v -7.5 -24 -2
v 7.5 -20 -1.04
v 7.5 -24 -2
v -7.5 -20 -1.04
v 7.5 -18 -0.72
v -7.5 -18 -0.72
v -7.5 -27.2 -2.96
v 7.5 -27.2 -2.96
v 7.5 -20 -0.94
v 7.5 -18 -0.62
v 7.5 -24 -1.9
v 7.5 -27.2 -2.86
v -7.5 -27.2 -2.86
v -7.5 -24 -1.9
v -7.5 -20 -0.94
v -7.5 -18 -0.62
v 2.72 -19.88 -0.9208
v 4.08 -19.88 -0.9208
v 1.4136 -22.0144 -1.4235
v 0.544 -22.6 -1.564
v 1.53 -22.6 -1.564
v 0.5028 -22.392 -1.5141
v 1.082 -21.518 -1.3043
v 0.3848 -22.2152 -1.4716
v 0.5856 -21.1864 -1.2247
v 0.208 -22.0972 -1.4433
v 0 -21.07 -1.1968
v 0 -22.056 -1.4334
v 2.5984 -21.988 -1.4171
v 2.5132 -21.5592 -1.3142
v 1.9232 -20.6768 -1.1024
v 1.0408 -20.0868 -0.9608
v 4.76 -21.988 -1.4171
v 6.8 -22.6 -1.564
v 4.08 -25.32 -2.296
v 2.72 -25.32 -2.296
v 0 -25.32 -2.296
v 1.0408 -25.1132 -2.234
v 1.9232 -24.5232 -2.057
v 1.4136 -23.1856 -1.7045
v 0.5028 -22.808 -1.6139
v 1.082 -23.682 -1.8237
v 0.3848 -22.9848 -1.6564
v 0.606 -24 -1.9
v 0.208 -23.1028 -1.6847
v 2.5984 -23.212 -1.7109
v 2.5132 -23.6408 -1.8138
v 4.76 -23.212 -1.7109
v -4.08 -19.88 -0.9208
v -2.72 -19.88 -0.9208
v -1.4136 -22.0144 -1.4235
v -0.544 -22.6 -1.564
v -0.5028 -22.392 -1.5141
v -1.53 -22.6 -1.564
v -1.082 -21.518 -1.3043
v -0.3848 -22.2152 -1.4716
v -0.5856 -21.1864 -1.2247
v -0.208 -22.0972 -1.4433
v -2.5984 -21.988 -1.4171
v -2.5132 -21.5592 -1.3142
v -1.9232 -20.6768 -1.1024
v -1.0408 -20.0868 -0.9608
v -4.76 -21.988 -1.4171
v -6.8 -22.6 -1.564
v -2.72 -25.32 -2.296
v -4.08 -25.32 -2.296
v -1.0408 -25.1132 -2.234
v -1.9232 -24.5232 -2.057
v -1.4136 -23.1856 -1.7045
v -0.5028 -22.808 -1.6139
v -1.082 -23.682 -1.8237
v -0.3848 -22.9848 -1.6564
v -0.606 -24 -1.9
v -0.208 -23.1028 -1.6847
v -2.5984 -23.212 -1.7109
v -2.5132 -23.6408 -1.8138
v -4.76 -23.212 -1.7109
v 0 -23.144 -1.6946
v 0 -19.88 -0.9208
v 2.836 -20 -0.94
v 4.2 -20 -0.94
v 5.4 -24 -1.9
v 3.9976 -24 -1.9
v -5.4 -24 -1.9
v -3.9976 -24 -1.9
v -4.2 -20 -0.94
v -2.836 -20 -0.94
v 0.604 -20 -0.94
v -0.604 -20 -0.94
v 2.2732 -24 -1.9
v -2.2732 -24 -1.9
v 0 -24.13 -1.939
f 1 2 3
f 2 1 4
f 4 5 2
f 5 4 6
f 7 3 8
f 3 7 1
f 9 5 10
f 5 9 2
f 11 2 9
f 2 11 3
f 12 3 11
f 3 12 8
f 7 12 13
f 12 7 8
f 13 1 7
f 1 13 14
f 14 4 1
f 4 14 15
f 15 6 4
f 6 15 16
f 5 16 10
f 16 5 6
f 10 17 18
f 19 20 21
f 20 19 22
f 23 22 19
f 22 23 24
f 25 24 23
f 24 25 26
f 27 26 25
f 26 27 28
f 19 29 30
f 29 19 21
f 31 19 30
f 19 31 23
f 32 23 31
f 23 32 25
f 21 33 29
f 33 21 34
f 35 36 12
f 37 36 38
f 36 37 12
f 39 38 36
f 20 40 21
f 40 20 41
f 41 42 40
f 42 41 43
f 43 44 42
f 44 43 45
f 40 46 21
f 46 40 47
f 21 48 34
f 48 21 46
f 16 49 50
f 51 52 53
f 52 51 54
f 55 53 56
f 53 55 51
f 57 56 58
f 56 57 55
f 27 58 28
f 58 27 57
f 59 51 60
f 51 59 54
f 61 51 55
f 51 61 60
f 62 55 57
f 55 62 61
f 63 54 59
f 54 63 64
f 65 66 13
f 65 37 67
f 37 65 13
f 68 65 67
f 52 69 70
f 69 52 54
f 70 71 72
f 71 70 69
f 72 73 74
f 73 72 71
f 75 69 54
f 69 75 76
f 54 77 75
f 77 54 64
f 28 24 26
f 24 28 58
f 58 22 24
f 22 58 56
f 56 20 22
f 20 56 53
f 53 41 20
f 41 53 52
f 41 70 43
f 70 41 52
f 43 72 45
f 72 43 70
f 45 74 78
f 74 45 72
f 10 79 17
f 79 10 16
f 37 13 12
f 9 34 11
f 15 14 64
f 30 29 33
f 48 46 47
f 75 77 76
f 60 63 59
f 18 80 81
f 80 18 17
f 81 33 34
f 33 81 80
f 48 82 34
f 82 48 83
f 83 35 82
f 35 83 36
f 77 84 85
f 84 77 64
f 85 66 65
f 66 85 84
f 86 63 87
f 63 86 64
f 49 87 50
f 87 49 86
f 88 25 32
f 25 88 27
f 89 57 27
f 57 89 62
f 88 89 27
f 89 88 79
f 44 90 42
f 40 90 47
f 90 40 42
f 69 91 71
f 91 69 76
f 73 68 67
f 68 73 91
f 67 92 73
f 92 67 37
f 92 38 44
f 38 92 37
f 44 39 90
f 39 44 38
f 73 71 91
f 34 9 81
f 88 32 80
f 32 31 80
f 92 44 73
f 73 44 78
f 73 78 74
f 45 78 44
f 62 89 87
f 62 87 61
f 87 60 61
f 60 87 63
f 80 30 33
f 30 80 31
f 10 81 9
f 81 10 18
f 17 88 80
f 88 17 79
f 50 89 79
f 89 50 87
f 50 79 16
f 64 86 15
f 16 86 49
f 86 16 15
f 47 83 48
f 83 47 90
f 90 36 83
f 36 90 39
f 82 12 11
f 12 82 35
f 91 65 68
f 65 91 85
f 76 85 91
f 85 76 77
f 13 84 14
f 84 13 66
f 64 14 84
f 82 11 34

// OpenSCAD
use <../lib.scad>
use <4198678dc01.scad>
function ldraw_lib__4207712bc01() = [
// 0 =Sticker  1.2 x  1.9 with Silver Train Logo (Formed)
// 0 Name: 4207712bc01.dat
// 0 Author: Tim Lampmann [L4mpi]
// 0 !LDRAW_ORG Part Alias UPDATE 2019-03
// 0 !LICENSE Licensed under CC BY 2.0 and CC BY 4.0 : see CAreadme.txt
// 
// 0 !HELP Origin = Origin Part 45677
// 
// 0 BFC CERTIFY CCW
  [0,"BFC","CERTIFY"],
  [0,"BFC","CCW"],
// 
// 0 !KEYWORDS Level Crossing, Set 10128
// 
// 0 !HISTORY 2019-12-27 [PTadmin] Official Update 2019-03
// 
// 
// 0 // Alias of 4198678dc01
// 
// 1 16 0 0 0 1 0 0 0 1 0 0 0 1 4198678dc01.dat
  [1,16,0,0,0,1,0,0,0,1,0,0,0,1, ldraw_lib__4198678dc01()],
];
makepoly(ldraw_lib__4207712bc01(), line=0.2);
